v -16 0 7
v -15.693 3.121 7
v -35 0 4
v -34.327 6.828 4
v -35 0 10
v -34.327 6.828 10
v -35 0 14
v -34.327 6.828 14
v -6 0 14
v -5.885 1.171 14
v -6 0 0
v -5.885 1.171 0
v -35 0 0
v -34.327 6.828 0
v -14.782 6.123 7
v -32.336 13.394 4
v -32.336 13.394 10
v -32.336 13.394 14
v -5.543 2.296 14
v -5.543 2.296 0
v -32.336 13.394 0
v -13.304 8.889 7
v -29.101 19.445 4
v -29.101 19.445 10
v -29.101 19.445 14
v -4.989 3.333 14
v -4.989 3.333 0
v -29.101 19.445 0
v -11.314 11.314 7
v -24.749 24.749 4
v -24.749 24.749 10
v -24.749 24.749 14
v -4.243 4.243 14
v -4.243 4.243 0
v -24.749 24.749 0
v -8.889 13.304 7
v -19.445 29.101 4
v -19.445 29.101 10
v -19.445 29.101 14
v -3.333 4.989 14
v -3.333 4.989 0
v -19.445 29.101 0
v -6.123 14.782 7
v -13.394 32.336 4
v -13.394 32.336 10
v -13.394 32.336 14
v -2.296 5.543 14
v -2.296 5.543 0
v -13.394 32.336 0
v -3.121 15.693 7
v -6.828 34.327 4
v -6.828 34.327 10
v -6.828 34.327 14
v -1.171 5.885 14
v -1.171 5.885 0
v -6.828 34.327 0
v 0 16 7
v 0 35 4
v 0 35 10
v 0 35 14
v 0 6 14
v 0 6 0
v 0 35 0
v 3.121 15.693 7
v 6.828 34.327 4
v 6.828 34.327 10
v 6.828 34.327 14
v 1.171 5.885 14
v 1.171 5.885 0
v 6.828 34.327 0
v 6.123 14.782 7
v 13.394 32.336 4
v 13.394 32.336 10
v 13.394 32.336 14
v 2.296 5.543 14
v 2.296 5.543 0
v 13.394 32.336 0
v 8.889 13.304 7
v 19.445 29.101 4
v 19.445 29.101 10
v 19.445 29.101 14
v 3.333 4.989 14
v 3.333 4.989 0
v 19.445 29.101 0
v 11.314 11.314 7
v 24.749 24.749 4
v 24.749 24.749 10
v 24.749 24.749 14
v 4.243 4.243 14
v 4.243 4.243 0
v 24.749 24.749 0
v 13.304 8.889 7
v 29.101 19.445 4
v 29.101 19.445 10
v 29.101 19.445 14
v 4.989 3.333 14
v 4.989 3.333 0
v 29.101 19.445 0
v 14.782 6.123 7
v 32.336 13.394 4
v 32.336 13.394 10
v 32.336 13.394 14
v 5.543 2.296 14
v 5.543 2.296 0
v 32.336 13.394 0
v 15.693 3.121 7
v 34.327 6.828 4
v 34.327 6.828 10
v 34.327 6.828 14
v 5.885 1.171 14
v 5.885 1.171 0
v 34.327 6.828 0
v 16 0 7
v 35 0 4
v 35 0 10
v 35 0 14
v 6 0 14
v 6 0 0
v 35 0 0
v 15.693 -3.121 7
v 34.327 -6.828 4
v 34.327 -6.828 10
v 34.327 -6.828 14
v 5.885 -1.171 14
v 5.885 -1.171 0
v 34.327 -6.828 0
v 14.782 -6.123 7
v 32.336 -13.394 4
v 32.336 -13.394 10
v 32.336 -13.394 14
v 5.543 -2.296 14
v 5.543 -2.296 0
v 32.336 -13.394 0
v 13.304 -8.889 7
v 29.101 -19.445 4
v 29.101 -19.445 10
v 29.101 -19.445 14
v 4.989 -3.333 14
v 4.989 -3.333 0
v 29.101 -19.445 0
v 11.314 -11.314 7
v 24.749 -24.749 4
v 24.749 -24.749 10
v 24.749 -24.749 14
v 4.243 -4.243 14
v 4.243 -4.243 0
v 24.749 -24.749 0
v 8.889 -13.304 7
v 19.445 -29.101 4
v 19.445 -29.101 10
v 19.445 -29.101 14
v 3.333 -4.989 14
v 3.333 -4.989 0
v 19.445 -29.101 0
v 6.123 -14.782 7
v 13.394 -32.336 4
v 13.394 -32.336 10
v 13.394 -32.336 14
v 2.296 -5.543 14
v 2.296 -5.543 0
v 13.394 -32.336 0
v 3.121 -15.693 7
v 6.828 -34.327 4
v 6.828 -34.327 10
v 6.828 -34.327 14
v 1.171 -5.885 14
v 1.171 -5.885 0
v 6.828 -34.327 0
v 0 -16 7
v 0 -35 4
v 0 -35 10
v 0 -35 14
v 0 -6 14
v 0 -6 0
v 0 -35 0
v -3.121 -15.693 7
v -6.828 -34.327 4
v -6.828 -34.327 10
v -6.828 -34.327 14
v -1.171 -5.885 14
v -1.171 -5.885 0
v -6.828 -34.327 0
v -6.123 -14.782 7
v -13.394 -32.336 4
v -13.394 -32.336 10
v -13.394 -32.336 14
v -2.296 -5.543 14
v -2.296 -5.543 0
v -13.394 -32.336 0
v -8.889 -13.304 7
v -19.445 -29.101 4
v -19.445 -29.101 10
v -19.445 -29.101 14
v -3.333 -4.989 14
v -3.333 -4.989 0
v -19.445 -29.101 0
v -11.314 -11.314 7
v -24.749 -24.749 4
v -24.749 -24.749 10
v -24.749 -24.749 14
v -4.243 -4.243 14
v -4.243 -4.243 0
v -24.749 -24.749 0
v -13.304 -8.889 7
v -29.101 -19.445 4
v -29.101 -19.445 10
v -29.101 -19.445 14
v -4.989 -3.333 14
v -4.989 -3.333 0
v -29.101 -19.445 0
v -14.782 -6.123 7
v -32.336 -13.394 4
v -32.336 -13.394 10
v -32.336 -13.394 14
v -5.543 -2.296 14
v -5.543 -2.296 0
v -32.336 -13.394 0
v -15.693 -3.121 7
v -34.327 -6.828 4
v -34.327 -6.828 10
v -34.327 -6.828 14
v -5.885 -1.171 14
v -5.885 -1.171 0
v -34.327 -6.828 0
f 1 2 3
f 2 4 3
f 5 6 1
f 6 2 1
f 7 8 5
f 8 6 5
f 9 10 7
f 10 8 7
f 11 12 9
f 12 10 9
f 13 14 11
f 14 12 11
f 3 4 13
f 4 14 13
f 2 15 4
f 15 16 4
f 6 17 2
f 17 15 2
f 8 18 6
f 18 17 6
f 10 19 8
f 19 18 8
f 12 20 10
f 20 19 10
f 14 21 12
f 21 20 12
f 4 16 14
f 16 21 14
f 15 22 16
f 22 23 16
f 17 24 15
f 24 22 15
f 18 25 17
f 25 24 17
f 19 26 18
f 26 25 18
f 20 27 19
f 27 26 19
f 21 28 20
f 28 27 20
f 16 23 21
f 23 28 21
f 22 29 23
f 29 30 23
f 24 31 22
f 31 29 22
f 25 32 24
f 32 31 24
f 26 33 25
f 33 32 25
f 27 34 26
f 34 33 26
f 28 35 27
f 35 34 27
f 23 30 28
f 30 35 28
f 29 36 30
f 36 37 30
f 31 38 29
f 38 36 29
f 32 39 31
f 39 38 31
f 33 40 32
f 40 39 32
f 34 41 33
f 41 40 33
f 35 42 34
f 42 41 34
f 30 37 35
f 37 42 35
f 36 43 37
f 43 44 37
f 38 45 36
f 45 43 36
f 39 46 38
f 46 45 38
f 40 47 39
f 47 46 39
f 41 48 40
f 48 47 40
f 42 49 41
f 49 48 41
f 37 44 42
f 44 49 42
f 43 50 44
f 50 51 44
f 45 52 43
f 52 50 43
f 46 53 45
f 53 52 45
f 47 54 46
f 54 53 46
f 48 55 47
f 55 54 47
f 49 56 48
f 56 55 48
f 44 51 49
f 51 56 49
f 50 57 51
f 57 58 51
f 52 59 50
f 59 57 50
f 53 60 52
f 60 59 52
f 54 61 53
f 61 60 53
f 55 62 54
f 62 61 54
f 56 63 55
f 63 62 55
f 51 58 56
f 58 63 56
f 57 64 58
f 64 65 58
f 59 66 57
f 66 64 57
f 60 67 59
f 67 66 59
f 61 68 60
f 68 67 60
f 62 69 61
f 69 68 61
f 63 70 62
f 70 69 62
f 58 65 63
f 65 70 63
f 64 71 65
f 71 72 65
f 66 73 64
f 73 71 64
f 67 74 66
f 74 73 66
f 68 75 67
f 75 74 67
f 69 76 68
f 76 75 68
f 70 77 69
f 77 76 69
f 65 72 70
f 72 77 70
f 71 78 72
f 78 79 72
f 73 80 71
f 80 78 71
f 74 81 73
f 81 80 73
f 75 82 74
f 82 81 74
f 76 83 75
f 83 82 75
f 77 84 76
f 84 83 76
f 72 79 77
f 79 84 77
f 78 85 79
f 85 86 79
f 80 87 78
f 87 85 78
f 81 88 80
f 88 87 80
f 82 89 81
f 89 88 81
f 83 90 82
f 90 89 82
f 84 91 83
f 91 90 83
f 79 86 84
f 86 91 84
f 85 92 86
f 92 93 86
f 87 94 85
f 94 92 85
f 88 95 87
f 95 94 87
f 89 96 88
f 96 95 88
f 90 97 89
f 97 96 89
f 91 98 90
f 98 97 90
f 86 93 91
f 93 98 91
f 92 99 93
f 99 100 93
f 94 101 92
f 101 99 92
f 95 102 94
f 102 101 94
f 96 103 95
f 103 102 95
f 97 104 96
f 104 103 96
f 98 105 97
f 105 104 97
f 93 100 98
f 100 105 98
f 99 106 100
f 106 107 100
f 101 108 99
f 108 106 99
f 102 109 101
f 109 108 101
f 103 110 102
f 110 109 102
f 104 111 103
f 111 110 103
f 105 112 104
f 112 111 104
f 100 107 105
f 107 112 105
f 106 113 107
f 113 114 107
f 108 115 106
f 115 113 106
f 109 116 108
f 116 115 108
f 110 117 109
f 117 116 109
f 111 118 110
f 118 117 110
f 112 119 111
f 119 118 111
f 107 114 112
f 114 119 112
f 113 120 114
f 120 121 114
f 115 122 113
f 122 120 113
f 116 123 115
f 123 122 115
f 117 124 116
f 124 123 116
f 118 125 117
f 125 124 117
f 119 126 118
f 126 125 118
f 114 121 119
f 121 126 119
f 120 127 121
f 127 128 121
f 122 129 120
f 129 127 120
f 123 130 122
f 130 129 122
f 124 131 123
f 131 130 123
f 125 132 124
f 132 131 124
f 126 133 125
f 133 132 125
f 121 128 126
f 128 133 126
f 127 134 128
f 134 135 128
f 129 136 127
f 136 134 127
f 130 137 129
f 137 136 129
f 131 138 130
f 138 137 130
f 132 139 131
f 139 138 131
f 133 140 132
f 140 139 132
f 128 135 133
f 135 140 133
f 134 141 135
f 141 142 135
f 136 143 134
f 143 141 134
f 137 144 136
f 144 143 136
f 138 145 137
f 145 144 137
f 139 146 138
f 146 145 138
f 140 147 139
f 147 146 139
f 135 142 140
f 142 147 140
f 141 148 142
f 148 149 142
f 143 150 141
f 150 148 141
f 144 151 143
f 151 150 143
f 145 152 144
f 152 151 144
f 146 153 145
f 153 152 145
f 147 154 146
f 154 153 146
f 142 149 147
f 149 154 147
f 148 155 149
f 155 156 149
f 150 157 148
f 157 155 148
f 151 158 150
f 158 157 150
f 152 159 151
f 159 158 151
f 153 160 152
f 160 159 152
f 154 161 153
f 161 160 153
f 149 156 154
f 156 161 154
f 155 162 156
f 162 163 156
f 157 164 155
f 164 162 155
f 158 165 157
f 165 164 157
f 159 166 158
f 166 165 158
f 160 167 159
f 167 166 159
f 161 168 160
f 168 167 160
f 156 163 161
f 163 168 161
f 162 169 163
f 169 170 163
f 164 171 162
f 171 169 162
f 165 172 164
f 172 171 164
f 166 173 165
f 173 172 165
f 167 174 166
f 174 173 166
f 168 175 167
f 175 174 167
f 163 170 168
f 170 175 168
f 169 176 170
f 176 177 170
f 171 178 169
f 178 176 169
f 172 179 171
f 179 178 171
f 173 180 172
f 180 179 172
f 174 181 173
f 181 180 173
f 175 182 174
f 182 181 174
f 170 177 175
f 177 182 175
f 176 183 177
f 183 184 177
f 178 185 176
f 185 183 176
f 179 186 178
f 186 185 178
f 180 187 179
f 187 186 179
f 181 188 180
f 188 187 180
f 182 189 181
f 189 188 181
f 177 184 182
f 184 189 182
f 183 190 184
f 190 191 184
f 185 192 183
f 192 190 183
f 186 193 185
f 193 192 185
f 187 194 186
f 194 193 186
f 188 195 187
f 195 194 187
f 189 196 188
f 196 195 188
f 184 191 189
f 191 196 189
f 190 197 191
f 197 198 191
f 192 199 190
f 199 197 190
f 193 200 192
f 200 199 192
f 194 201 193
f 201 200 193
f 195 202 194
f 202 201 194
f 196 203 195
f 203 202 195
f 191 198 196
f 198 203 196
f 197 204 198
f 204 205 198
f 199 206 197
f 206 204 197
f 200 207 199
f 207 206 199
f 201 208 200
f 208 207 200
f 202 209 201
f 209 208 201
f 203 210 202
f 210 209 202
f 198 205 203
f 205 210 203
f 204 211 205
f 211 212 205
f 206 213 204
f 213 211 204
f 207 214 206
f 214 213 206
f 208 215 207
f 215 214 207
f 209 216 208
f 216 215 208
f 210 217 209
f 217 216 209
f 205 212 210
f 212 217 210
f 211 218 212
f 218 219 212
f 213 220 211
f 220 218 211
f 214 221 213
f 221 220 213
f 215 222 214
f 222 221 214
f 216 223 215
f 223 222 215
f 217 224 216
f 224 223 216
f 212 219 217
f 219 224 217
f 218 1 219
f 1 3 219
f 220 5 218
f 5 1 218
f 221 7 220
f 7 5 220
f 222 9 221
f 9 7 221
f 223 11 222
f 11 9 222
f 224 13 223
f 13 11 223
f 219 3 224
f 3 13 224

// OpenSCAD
$fn = 32;

// ----------------------------------------------------------------------
// Revolved part: V-groove pulley R35
// ----------------------------------------------------------------------

// --- parameters (mm) ---
bore_r = 6;               // bore radius
rim_r = 35;               // rim radius
rim_t = 14;               // rim width
groove_r = 16;            // groove root radius
groove_w = 3;             // groove half width
revolve_angle = 360;      // revolve sweep, degrees

bore_d = 2 * bore_r;
rim_d = 2 * rim_r;
groove_d = 2 * groove_r;

profile = [[6, 0], [35, 0], [35, 4], [16, 7], [35, 10], [35, 14], [6, 14]];  // primary outline, 7 points, counter clockwise

// --- the one profile operation ---
rotate_extrude(angle = revolve_angle) polygon(points = profile);
